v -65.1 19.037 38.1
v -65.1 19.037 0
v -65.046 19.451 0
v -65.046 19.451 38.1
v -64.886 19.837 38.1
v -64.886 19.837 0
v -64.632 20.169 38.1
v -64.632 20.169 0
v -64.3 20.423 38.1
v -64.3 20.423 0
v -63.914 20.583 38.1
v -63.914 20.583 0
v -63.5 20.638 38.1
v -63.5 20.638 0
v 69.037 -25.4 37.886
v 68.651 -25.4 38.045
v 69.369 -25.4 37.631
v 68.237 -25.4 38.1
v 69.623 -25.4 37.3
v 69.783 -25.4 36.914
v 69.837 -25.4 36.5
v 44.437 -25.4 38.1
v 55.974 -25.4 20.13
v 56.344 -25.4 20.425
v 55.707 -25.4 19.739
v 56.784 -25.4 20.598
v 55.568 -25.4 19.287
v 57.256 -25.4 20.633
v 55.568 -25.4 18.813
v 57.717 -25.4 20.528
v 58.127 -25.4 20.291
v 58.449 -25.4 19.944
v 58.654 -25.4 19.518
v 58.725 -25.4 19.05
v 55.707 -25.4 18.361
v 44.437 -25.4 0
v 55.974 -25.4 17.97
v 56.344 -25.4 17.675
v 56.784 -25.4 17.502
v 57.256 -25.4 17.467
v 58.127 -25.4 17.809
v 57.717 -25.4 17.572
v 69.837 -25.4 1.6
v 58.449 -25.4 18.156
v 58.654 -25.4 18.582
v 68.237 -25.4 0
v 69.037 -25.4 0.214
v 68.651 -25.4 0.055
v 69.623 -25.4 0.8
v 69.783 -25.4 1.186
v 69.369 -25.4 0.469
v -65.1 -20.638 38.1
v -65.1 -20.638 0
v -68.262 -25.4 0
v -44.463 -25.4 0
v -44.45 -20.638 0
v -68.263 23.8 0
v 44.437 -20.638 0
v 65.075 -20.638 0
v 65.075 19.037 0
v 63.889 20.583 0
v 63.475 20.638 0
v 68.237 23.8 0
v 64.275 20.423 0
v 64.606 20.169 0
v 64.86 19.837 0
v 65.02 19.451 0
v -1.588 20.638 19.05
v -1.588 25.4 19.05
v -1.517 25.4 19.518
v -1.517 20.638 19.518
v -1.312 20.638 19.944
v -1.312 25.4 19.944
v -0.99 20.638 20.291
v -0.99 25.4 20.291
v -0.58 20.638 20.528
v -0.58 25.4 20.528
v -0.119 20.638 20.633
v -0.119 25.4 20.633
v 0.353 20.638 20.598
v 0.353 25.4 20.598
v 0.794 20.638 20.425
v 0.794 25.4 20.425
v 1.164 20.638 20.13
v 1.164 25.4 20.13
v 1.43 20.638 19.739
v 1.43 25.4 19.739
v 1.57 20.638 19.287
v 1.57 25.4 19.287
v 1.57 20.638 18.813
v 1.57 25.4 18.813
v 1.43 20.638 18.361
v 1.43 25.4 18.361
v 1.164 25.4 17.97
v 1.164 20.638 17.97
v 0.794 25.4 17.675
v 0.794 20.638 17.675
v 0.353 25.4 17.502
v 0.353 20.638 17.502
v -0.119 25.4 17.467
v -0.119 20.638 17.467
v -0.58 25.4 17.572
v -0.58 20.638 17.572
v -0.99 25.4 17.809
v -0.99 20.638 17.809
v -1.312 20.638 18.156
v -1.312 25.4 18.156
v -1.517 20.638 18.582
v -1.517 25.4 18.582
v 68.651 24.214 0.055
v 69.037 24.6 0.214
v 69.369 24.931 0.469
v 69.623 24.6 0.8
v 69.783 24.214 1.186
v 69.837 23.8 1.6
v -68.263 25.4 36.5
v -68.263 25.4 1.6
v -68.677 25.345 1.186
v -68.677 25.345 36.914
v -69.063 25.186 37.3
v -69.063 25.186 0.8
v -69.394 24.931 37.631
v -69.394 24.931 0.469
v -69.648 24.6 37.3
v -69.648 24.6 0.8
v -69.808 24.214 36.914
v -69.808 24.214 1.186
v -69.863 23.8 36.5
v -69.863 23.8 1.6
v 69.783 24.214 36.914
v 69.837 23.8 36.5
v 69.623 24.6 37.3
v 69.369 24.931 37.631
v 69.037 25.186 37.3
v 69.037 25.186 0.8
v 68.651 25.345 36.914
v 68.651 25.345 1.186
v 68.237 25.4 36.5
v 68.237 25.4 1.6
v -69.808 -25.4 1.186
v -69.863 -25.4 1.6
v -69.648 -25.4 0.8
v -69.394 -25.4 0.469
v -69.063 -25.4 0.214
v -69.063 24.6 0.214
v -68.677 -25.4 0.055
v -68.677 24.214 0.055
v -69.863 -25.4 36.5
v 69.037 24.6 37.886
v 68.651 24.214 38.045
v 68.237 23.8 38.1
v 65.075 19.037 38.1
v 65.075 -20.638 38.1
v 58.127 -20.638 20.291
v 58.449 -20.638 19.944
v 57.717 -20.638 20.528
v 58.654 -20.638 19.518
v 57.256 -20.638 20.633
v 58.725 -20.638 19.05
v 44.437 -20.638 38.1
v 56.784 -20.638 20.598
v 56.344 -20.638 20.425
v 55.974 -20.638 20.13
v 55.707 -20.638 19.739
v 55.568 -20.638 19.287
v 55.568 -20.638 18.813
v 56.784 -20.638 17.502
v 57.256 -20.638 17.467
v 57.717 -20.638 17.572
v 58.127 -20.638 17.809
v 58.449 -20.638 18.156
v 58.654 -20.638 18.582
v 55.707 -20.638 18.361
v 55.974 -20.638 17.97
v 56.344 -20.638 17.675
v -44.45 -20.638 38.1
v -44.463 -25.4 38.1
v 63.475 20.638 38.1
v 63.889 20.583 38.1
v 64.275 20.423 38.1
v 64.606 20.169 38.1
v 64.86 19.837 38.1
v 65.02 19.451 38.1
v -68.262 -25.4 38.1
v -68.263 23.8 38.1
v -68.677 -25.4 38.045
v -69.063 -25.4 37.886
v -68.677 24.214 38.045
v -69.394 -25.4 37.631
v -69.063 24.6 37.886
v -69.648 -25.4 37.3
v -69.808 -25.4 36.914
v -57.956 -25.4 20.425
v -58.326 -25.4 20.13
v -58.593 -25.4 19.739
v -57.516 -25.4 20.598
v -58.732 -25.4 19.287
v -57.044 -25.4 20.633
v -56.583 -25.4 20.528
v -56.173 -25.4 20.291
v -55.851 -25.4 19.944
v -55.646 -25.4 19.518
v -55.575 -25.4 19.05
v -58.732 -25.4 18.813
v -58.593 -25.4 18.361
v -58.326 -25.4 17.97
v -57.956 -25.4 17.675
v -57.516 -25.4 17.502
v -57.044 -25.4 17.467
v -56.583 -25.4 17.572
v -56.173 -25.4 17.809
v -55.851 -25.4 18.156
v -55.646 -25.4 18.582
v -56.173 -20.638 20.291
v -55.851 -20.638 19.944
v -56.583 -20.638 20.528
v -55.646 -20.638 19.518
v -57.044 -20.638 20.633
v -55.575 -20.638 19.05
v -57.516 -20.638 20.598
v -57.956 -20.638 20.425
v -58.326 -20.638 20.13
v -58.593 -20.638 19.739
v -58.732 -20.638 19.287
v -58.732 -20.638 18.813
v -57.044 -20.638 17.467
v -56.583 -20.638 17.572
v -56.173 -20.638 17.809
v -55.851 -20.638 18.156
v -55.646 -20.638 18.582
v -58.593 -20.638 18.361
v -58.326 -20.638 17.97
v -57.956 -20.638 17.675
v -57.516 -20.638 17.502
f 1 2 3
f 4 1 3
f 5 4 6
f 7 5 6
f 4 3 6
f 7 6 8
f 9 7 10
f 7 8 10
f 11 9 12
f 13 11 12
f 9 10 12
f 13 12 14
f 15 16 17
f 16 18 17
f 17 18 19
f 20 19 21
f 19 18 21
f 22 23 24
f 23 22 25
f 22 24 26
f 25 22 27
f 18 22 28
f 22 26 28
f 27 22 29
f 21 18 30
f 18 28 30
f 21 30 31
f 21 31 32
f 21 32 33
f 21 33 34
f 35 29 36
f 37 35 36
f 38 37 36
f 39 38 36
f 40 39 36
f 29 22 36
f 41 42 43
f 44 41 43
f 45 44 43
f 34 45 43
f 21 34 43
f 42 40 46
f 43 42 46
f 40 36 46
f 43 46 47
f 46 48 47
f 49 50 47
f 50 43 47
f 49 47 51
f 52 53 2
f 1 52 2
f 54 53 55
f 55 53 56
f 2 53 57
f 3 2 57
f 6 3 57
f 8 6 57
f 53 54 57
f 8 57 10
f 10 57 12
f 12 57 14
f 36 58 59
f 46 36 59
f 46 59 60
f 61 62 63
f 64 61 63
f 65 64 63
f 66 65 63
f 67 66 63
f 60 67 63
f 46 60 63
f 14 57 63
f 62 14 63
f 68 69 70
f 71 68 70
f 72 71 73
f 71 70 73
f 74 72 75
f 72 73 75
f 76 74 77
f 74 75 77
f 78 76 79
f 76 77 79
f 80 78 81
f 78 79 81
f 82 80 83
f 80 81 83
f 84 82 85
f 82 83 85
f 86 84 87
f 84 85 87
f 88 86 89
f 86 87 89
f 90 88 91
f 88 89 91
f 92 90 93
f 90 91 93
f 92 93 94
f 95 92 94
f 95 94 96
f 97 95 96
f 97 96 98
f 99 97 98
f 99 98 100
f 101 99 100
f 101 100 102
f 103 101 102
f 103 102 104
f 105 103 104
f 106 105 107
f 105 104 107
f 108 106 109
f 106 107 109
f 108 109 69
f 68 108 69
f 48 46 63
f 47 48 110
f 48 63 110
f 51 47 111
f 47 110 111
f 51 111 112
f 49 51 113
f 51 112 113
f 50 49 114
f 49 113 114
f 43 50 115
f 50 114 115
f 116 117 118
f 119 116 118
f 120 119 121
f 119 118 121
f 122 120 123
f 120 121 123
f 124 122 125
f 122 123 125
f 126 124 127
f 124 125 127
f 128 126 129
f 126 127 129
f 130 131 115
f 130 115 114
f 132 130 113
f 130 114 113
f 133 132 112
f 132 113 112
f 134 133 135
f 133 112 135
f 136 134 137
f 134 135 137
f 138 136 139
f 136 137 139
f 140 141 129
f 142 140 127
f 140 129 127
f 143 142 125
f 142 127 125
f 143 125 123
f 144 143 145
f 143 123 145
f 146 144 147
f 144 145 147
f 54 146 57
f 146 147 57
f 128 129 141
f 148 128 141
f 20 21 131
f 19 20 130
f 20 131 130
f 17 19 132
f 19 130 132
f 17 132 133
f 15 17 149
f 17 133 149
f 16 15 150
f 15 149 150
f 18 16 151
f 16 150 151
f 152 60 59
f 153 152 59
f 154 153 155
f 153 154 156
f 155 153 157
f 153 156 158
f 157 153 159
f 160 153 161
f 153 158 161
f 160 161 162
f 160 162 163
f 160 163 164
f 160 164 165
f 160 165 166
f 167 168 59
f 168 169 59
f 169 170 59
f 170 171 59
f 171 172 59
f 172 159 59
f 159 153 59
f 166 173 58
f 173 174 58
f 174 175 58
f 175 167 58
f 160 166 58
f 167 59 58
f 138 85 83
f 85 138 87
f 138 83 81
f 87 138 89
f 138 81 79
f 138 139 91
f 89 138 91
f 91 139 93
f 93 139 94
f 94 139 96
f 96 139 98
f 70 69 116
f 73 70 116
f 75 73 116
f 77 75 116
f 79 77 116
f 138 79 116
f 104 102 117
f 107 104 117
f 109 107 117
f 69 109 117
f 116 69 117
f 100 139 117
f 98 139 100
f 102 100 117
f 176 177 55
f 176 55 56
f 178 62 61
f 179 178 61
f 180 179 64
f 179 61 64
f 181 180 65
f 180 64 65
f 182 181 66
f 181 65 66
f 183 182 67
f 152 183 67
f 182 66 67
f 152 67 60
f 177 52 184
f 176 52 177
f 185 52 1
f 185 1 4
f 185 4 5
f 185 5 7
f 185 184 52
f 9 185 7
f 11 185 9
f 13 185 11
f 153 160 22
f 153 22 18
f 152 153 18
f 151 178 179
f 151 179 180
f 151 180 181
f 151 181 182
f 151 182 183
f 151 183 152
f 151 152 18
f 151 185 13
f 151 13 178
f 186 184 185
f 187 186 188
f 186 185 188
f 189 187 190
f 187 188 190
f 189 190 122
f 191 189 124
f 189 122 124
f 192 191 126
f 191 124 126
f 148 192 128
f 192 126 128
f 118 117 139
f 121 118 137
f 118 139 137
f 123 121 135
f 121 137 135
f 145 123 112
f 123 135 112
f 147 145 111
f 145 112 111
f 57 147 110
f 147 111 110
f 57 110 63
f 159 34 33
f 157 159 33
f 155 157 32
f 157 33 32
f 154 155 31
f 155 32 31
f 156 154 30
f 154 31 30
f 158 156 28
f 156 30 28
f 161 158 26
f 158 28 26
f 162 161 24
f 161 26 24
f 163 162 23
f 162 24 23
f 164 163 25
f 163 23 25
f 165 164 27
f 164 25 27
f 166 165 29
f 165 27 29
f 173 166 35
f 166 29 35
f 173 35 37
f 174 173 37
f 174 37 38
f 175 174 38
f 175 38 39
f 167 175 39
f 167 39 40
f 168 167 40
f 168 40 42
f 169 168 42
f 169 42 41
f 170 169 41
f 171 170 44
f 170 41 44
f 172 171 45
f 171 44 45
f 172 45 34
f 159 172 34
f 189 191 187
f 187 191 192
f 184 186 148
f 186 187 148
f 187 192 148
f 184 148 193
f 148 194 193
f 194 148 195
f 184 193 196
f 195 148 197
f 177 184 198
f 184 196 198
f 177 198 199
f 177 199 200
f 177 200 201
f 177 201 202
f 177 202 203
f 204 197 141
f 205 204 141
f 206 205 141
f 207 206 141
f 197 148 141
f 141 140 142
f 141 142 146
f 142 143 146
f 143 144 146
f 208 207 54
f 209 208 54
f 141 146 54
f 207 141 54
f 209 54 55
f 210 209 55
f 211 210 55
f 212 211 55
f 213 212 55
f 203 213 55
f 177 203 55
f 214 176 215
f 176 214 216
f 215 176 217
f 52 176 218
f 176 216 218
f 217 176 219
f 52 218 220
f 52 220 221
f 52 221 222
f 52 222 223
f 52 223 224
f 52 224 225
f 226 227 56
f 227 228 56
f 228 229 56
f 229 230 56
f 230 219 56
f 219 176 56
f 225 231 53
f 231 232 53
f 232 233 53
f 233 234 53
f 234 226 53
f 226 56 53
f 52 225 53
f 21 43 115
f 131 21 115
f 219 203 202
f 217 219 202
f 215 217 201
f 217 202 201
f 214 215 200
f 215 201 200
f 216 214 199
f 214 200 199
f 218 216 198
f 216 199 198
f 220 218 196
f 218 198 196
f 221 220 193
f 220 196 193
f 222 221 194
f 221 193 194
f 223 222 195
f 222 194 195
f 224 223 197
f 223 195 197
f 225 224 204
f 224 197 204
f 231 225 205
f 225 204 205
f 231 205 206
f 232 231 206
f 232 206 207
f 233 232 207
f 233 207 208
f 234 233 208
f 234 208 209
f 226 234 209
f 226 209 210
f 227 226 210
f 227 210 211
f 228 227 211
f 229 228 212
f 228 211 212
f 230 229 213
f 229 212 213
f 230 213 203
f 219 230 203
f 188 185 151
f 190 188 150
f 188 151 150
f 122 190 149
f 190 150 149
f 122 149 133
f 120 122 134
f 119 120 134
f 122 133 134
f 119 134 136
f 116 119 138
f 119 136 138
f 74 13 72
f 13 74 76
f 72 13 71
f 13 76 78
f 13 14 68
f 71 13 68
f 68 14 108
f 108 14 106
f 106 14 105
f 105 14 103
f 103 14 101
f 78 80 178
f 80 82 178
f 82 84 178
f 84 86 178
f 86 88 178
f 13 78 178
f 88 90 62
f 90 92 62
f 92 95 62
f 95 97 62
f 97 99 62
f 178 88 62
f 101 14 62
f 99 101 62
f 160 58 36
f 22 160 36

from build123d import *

# Parameters (mm, degrees)
F1_DEPTH = 38.1
F2_R     = 1.5875
F3_DEPTH = 4.7625
F4_R     = 1.5875
F5_DEPTH = 4.7625
F7_DEPTH = 50.8
F9_DEPTH = 139.7


with BuildPart() as f1:
    # F0 (on Top) → F1 (new body)
    with BuildSketch(Plane.XY):
        with BuildLine():
            Line((-69.8627, -25.4), (-44.4627, -25.4))
            Line((-44.4627, -25.4), (-44.45, -20.6375))
            Line((-44.45, -20.6375), (-65.1002, -20.6375))
            Line((-65.1002, -20.6375), (-65.1002, 19.0373))
            ThreePointArc((-65.1002, 19.0373), (-64.631512, 20.168812), (-63.5, 20.6375))
            Line((-63.5, 20.6375), (63.4746, 20.6375))
            ThreePointArc((63.4746, 20.6375), (64.606112, 20.168812), (65.0748, 19.0373))
            Line((65.0748, 19.0373), (65.0748, -20.6375))
            Line((65.0748, -20.6375), (44.4373, -20.6375))
            Line((44.4373, -20.6375), (44.4373, -25.4))
            Line((44.4373, -25.4), (69.8373, -25.4))
            Line((69.8373, -25.4), (69.8373, 23.7998))
            ThreePointArc((69.8373, 23.7998), (69.368612, 24.931312), (68.2371, 25.4))
            Line((68.2371, 25.4), (-68.2625, 25.4))
            ThreePointArc((-68.2625, 25.4), (-69.394012, 24.931312), (-69.8627, 23.7998))
            Line((-69.8627, 23.7998), (-69.8627, -25.4))
        make_face()
    extrude(amount=F1_DEPTH)

    # F2 (on face) → F3 (cut)
    with BuildSketch(Plane.XZ.offset(25.4)):
        with Locations((-57.1627, 19.05)):
            Circle(F2_R)
        with Locations((57.1373, 19.05)):
            Circle(F2_R)
    extrude(amount=-F3_DEPTH, mode=Mode.SUBTRACT)

    # F4 (on face) → F5 (cut)
    with BuildSketch(Plane(origin=(0, 25.4, 0), x_dir=(-1, 0, 0), z_dir=(0, 1, 0))):
        with Locations((0, 19.05)):
            Circle(F4_R)
    extrude(amount=-F5_DEPTH, mode=Mode.SUBTRACT)

    # F6 (on face) → F7 (cut)
    with BuildSketch(Plane(origin=(0, 25.4, 0), x_dir=(-1, 0, 0), z_dir=(0, 1, 0))):
        with BuildLine():
            ThreePointArc((-69.8373, 36.4998), (-69.368612, 37.631312), (-68.2371, 38.1))
            Line((-68.2371, 38.1), (-69.8373, 38.1))
            Line((-69.8373, 38.1), (-69.8373, 36.4998))
        make_face()
        with BuildLine():
            ThreePointArc((-68.2371, 0), (-69.368612, 0.468688), (-69.8373, 1.6002))
            Line((-69.8373, 1.6002), (-69.8373, 0))
            Line((-69.8373, 0), (-68.2371, 0))
        make_face()
        with BuildLine():
            ThreePointArc((69.8627, 1.6002), (69.394012, 0.468688), (68.2625, 0))
            Line((68.2625, 0), (69.8627, 0))
            Line((69.8627, 0), (69.8627, 1.6002))
        make_face()
        with BuildLine():
            ThreePointArc((68.2625, 38.1), (69.394012, 37.631312), (69.8627, 36.4998))
            Line((69.8627, 36.4998), (69.8627, 38.1))
            Line((69.8627, 38.1), (68.2625, 38.1))
        make_face()
    extrude(amount=-F7_DEPTH, mode=Mode.SUBTRACT)

    # F8 (on face) → F9 (cut)
    with BuildSketch(Plane.YZ.offset(69.8373)):
        with BuildLine():
            ThreePointArc((23.7998, 38.1), (24.931312, 37.631312), (25.4, 36.4998))
            Line((25.4, 36.4998), (25.4, 38.1))
            Line((25.4, 38.1), (23.7998, 38.1))
        make_face()
        with BuildLine():
            ThreePointArc((25.4, 1.6002), (24.931312, 0.468688), (23.7998, 0))
            Line((23.7998, 0), (25.4, 0))
            Line((25.4, 0), (25.4, 1.6002))
        make_face()
    extrude(amount=-F9_DEPTH, mode=Mode.SUBTRACT)


solid = f1.part
